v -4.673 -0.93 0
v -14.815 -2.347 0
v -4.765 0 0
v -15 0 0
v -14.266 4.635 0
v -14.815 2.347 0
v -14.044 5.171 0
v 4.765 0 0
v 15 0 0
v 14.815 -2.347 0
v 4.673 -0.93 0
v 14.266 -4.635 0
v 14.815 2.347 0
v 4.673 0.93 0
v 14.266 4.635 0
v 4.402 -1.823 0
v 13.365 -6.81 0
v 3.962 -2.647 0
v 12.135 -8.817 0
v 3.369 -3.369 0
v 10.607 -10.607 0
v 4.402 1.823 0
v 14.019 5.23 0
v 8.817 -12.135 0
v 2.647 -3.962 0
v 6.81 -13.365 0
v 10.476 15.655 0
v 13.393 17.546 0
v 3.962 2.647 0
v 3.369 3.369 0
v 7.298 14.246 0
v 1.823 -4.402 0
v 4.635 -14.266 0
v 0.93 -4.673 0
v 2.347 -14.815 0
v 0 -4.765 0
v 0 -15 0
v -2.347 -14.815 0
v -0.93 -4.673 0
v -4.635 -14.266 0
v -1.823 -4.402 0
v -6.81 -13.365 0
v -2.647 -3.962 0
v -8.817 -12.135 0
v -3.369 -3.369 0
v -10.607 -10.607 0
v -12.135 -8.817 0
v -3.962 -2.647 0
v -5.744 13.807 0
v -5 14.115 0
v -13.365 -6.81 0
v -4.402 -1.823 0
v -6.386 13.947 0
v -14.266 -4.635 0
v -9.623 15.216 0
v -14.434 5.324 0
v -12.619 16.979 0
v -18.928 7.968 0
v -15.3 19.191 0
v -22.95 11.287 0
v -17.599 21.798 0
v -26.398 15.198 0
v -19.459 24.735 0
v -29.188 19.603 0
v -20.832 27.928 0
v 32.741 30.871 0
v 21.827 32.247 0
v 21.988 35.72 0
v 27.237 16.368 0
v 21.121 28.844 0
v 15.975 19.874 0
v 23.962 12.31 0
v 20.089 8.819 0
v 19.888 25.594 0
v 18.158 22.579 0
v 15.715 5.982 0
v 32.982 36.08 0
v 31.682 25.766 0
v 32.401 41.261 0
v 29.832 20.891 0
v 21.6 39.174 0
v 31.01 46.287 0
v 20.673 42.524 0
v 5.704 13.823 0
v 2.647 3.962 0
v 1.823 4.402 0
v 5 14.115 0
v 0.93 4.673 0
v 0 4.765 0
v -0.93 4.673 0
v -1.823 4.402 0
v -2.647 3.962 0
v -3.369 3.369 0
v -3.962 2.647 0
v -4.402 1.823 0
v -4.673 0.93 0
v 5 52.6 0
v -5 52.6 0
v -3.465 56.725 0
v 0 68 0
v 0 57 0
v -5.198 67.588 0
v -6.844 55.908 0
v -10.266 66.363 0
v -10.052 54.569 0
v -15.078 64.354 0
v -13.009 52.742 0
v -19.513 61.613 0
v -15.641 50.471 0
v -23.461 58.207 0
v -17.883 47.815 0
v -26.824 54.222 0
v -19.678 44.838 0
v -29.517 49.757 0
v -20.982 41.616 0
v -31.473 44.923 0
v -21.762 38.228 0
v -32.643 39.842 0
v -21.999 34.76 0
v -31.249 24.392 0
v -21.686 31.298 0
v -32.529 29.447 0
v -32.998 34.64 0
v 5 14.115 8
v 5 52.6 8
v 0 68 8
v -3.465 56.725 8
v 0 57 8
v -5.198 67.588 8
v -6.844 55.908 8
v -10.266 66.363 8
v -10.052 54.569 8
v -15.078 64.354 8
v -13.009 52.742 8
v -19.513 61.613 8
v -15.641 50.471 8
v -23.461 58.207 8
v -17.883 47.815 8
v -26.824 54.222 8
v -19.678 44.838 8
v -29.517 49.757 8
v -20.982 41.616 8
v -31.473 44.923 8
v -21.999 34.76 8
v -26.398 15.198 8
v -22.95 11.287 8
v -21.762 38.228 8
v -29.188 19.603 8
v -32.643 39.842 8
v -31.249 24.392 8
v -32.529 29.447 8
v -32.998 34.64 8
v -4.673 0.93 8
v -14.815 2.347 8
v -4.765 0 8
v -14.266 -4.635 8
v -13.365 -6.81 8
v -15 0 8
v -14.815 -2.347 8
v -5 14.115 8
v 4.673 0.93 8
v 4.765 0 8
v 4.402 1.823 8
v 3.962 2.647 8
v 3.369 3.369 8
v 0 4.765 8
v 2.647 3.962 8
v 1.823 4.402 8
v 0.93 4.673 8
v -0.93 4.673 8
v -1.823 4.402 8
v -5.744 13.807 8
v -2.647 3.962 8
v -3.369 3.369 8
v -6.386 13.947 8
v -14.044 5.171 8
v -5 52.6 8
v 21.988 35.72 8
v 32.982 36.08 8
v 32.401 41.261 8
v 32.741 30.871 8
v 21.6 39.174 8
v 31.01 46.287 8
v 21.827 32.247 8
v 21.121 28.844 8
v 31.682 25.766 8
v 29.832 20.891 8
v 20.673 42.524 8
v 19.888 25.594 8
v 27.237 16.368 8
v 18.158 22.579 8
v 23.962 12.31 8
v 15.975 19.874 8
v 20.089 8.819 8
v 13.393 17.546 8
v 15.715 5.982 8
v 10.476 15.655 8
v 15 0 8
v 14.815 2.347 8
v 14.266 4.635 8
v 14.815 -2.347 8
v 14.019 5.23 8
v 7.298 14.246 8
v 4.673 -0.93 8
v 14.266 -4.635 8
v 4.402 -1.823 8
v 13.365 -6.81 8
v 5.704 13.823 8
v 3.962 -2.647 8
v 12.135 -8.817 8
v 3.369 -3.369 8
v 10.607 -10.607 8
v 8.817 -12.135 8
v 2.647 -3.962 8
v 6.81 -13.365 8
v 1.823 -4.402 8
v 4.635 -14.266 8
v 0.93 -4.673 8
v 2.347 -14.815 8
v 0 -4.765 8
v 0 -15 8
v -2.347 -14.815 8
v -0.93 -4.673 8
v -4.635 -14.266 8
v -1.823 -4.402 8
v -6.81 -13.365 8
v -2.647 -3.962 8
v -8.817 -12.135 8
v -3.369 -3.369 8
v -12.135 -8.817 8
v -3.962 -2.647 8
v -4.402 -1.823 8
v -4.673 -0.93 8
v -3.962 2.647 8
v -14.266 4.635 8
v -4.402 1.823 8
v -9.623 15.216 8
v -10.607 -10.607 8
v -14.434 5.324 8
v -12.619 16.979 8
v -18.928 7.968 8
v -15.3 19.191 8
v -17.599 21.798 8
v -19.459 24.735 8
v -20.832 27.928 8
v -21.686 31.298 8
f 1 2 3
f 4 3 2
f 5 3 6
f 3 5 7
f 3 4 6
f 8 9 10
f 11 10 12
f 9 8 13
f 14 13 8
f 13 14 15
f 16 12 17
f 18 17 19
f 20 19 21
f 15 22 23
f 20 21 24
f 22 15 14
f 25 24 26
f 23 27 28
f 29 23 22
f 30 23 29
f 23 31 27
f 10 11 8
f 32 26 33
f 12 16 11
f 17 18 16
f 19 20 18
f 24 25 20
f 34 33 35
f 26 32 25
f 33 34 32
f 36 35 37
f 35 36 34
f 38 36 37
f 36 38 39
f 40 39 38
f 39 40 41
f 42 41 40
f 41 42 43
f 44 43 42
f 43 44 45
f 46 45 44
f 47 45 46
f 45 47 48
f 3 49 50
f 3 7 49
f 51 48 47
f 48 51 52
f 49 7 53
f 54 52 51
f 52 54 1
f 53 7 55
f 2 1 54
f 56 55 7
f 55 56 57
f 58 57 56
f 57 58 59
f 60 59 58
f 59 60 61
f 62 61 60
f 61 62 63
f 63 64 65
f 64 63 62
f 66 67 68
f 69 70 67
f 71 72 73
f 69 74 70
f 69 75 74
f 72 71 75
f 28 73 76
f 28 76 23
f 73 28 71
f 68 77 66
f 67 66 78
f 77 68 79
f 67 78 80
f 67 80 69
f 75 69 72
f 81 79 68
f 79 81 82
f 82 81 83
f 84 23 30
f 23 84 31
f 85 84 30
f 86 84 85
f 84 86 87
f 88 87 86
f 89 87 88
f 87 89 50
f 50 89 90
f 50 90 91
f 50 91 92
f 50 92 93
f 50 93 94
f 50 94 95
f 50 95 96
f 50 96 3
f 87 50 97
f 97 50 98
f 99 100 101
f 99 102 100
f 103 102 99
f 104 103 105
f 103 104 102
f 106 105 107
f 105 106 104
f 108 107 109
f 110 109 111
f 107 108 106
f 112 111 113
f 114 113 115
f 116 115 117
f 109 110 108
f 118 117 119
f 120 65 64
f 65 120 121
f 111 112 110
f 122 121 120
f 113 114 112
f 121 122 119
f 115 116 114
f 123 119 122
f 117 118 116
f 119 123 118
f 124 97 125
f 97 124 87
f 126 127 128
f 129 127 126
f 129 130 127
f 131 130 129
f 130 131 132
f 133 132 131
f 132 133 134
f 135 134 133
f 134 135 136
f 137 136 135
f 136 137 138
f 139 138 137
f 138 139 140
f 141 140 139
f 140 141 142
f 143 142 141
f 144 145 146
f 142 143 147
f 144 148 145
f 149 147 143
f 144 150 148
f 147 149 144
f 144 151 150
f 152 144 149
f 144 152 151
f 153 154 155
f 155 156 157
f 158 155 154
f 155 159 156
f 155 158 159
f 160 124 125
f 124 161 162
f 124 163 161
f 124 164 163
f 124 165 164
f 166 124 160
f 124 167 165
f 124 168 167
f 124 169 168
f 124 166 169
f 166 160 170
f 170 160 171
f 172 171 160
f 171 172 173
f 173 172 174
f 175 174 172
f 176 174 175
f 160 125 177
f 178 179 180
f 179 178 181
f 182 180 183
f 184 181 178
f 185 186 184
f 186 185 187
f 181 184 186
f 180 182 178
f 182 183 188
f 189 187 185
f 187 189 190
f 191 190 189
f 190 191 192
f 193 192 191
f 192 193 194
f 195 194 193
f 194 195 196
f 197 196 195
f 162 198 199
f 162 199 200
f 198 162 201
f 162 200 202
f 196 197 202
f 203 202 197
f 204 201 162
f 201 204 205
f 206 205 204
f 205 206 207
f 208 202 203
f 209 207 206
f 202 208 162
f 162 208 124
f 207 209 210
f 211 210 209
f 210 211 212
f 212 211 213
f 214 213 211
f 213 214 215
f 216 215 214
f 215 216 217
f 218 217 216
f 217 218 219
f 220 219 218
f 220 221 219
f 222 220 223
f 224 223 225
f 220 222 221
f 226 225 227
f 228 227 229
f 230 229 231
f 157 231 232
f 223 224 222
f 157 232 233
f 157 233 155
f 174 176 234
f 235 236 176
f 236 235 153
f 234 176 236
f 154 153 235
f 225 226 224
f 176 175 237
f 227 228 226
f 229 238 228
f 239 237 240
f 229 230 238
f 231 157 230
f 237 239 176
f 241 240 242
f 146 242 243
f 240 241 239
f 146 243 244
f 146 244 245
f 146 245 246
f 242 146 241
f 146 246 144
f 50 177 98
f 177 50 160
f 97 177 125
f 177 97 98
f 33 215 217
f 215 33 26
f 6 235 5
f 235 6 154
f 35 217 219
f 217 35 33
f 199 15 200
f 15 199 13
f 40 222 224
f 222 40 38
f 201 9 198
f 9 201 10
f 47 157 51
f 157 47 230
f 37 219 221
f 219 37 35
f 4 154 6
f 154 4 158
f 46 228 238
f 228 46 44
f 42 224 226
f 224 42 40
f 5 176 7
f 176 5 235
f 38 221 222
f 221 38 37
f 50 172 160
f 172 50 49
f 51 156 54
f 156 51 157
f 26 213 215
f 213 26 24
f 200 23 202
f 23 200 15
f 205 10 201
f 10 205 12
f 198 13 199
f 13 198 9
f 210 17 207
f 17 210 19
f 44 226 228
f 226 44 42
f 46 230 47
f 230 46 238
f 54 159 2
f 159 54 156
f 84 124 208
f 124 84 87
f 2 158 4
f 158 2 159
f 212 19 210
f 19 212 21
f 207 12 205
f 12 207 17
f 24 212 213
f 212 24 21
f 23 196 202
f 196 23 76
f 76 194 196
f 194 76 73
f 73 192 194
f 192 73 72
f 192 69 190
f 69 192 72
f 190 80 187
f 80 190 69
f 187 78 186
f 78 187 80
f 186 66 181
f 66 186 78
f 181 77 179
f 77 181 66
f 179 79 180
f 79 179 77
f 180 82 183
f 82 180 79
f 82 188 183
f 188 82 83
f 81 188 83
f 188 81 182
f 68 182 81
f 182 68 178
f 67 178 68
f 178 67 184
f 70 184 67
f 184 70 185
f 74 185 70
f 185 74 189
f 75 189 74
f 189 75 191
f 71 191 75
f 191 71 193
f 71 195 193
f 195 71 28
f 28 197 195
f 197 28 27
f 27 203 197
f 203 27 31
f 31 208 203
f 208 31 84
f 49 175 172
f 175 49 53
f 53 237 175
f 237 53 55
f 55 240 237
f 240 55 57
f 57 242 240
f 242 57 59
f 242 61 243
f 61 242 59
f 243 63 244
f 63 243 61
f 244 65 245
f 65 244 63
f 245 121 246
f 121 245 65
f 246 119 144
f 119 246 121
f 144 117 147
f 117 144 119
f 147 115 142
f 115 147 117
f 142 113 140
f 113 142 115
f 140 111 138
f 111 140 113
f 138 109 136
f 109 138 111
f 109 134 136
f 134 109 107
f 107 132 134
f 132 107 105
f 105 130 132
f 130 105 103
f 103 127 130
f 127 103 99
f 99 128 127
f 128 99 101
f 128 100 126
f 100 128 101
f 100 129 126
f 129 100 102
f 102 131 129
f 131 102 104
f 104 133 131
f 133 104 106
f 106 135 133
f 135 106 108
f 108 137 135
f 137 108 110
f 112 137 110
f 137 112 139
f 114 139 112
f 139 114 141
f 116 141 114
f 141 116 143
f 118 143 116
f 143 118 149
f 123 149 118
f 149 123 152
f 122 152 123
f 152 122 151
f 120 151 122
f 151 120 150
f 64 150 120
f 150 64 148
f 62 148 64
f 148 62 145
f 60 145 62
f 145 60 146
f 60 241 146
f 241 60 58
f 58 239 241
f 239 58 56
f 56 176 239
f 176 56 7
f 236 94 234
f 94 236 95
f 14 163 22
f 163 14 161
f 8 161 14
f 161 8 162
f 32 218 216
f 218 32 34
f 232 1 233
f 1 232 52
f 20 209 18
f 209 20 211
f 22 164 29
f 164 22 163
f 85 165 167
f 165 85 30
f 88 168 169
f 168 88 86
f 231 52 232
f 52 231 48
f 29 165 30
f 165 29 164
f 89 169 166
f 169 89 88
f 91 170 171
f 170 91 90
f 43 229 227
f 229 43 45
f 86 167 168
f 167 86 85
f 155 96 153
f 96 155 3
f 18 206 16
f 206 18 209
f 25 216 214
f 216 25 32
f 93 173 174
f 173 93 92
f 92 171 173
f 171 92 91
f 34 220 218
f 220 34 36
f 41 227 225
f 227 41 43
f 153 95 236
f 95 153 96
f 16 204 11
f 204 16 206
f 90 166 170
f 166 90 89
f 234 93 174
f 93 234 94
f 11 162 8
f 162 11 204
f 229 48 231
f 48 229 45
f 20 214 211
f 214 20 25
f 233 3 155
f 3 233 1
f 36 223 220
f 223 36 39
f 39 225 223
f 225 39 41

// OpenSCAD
$fn = 32;

// ----------------------------------------------------------------------
// Hook: 70 mm shank into a 22 mm curl, 8 mm thick
// ----------------------------------------------------------------------

// --- parameters (mm) ---
shank_len = 70;           // shank length from the boss centre
shank_w = 10;             // shank width
boss_d = 30;              // boss diameter
bore_d = 9.53;            // boss bore
curl_in = 22;             // curl inner radius
curl_out = 33;            // curl outer radius
curl_sweep = 290;         // curl sweep angle
hook_t = 8;               // hook thickness

shank_profile = [[-5, 52.6], [5, 52.6], [5, 13], [-5, 13]];
boss_profile = [[15, 0], [14.815, 2.347], [14.266, 4.635], [13.365, 6.81], [12.135, 8.817], [10.607, 10.607], [8.817, 12.135], [6.81, 13.365], [4.635, 14.266], [2.347, 14.815], [0, 15], [-2.347, 14.815], [-4.635, 14.266], [-6.81, 13.365], [-8.817, 12.135], [-10.607, 10.607], [-12.135, 8.817], [-13.365, 6.81], [-14.266, 4.635], [-14.815, 2.347], [-15, 0], [-14.815, -2.347], [-14.266, -4.635], [-13.365, -6.81], [-12.135, -8.817], [-10.607, -10.607], [-8.817, -12.135], [-6.81, -13.365], [-4.635, -14.266], [-2.347, -14.815], [0, -15], [2.347, -14.815], [4.635, -14.266], [6.81, -13.365], [8.817, -12.135], [10.607, -10.607], [12.135, -8.817], [13.365, -6.81], [14.266, -4.635], [14.815, -2.347]];
curl_profile = [[0, 68], [-5.198, 67.588], [-10.266, 66.363], [-15.078, 64.354], [-19.513, 61.613], [-23.461, 58.207], [-26.824, 54.222], [-29.517, 49.757], [-31.473, 44.923], [-32.643, 39.842], [-32.998, 34.64], [-32.529, 29.447], [-31.249, 24.392], [-29.188, 19.603], [-26.398, 15.198], [-22.95, 11.287], [-18.928, 7.968], [-14.434, 5.324], [-9.579, 3.421], [-4.486, 2.306], [0.72, 2.008], [5.908, 2.533], [10.948, 3.869], [15.715, 5.982], [20.089, 8.819], [23.962, 12.31], [27.237, 16.368], [29.832, 20.891], [31.682, 25.766], [32.741, 30.871], [32.982, 36.08], [32.401, 41.261], [31.01, 46.287], [20.673, 42.524], [21.6, 39.174], [21.988, 35.72], [21.827, 32.247], [21.121, 28.844], [19.888, 25.594], [18.158, 22.579], [15.975, 19.874], [13.393, 17.546], [10.476, 15.655], [7.298, 14.246], [3.938, 13.355], [0.48, 13.005], [-2.99, 13.204], [-6.386, 13.947], [-9.623, 15.216], [-12.619, 16.979], [-15.3, 19.191], [-17.599, 21.798], [-19.459, 24.735], [-20.832, 27.928], [-21.686, 31.298], [-21.999, 34.76], [-21.762, 38.228], [-20.982, 41.616], [-19.678, 44.838], [-17.883, 47.815], [-15.641, 50.471], [-13.009, 52.742], [-10.052, 54.569], [-6.844, 55.908], [-3.465, 56.725], [0, 57]];

difference() {
  union() {
    /* three overlapping outlines: shank, boss and the smooth curl */
    linear_extrude(height = hook_t) polygon(shank_profile);
    linear_extrude(height = hook_t) polygon(boss_profile);
    linear_extrude(height = hook_t) polygon(curl_profile);
  }
  translate([0, 0, -2.5]) cylinder(h = hook_t + 5, d = bore_d);
}
